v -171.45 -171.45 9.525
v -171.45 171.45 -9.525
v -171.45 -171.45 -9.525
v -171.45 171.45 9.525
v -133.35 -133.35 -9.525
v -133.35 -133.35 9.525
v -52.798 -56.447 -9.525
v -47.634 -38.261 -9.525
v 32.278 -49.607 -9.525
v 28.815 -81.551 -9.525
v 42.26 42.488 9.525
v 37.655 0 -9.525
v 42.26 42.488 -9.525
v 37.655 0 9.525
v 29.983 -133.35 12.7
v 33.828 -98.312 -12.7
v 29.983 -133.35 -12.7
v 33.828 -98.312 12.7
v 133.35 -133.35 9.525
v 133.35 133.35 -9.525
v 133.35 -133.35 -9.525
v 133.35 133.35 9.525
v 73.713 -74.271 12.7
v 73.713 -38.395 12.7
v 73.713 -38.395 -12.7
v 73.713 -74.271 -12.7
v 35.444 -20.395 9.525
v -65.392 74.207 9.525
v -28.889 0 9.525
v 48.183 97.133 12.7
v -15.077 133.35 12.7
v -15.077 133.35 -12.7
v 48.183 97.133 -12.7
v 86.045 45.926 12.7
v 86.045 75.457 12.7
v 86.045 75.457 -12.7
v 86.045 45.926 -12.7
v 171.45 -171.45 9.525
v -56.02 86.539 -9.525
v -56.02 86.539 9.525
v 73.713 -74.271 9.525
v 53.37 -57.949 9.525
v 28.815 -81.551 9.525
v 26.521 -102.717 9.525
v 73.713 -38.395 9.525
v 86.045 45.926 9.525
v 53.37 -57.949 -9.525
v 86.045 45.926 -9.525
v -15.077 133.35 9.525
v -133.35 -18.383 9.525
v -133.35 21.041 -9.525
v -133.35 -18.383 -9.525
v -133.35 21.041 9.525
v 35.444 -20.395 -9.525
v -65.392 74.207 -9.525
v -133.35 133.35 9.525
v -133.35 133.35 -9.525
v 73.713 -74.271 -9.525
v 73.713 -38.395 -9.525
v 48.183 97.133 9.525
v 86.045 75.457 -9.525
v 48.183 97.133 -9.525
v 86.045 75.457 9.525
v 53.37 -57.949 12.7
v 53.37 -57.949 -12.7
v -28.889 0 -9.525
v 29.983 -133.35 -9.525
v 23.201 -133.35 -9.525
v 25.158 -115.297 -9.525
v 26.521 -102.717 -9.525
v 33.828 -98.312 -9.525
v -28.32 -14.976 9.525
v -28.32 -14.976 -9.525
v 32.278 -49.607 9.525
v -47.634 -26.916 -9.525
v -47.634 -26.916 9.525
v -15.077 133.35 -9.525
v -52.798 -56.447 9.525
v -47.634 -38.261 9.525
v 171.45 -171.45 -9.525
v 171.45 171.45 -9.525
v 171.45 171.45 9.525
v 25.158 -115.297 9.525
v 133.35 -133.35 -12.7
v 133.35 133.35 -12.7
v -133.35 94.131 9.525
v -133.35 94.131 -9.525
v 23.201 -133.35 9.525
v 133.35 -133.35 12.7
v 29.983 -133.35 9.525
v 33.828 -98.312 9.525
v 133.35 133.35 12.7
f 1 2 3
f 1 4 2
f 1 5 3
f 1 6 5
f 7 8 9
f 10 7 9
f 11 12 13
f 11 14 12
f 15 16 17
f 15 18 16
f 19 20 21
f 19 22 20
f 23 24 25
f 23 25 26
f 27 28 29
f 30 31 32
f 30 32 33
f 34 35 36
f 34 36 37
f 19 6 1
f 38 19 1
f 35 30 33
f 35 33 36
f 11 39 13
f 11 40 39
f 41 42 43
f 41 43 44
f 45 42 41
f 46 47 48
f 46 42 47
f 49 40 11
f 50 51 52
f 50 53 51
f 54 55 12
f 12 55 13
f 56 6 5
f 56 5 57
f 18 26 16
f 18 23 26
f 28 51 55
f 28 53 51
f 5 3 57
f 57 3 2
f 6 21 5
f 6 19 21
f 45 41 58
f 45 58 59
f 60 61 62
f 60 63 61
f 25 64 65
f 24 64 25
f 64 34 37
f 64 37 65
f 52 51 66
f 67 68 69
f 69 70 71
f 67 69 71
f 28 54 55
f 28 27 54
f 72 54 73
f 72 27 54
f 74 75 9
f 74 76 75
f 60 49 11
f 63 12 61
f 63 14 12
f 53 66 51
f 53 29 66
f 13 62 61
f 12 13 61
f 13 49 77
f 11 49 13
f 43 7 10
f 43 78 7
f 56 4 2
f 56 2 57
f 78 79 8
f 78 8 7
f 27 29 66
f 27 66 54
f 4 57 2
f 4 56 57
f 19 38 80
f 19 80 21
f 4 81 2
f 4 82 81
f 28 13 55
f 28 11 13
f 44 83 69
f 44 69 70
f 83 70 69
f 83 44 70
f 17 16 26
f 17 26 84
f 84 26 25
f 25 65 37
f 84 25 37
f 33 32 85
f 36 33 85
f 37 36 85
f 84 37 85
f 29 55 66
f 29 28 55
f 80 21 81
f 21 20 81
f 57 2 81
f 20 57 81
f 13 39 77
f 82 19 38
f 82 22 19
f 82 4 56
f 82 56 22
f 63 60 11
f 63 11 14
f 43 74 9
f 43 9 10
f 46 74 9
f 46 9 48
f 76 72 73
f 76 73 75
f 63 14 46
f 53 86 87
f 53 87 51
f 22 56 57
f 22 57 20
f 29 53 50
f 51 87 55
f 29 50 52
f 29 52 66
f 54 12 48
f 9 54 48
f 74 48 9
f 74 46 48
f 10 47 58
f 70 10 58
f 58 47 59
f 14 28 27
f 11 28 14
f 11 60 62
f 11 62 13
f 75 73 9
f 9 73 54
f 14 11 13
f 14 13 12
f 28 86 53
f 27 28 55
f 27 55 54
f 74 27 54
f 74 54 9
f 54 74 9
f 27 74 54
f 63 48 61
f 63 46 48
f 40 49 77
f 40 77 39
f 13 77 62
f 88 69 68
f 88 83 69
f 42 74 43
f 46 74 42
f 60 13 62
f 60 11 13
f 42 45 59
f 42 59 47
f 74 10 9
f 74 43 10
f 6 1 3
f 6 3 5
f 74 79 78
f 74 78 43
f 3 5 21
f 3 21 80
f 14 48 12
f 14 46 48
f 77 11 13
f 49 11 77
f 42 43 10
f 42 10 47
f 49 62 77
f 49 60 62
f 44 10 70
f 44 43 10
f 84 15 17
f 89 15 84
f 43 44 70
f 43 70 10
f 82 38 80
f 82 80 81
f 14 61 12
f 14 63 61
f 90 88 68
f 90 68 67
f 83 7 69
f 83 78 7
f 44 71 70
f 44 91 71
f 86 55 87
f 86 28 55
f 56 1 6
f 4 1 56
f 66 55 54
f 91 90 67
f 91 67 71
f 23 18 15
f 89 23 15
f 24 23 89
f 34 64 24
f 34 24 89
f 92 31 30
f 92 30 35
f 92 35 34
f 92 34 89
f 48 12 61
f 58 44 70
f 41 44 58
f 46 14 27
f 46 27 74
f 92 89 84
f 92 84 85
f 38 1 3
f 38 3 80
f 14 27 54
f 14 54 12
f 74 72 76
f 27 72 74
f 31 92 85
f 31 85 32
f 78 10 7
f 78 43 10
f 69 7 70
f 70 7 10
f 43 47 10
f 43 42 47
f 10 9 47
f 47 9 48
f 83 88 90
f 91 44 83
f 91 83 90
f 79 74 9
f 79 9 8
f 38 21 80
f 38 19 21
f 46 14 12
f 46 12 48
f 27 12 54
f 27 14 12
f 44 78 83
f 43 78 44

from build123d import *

# Parameters (mm, degrees)
F1_DEPTH  = 9.525
F2_DEPTH  = 9.525
F3_DEPTH  = 9.525
F4_DEPTH  = 9.525
F5_DEPTH  = 9.525
F6_DEPTH  = 9.525
F7_DEPTH  = 9.525
F8_DEPTH  = 9.525
F9_DEPTH  = 9.525
F10_DEPTH = 9.525
F11_DEPTH = 9.525
F12_DEPTH = 9.525
F13_DEPTH = 9.525
F14_DEPTH = 9.525
F15_DEPTH = 9.525
F16_DEPTH = 9.525
F17_DEPTH = 9.525
F18_DEPTH = 9.525
F19_DEPTH = 9.525
F20_DEPTH = 12.7


with BuildPart() as f1:
    # F0 (on Top) → F1 (new body, symmetric)
    with BuildSketch(Plane.XY):
        Polygon((-171.45, 171.45), (-171.45, -171.45), (-133.35, -133.35), (-133.35, -18.3831825852), (-133.35, 21.0410188884), (-133.35, 94.1308289766), (-133.35, 133.35), align=None)
    extrude(amount=F1_DEPTH, both=True)


with BuildPart() as f2:
    # F0 (on Top) → F2 (new body, symmetric)
    with BuildSketch(Plane.XY):
        Polygon((171.45, 171.45), (-171.45, 171.45), (-133.35, 133.35), (-85.5590856828, 133.35), (-15.077165328, 133.35), (133.35, 133.35), align=None)
    extrude(amount=F2_DEPTH, both=True)

    # F0 (on Top) → F3 (join, symmetric)
    with BuildSketch(Plane.XY):
        Polygon((133.35, -133.35), (171.45, -171.45), (171.45, 171.45), (133.35, 133.35), align=None)
    extrude(amount=F3_DEPTH, both=True)


with BuildPart() as f4:
    # F0 (on Top) → F4 (new body, symmetric)
    with BuildSketch(Plane.XY):
        Polygon((-133.35, -133.35), (-171.45, -171.45), (171.45, -171.45), (133.35, -133.35), (29.9828406423, -133.35), (23.2006912545, -133.35), align=None)
    extrude(amount=F4_DEPTH, both=True)


with BuildPart() as f5:
    # F0 (on Top) → F5 (new body, symmetric)
    with BuildSketch(Plane.XY):
        Polygon((42.2602014288, 42.4880021912), (-15.077165328, 133.35), (-56.0195036232, 86.5388959646), align=None)
    extrude(amount=F5_DEPTH, both=True)


with BuildPart() as f6:
    # F0 (on Top) → F6 (new body, symmetric)
    with BuildSketch(Plane.XY):
        Polygon((-52.7975902858, -56.4470457543), (25.1575205185, -115.2968105278), (26.521067056, -102.7170906481), (28.8153099508, -81.5510122196), align=None)
    extrude(amount=F6_DEPTH, both=True)


with BuildPart() as f7:
    # F0 (on Top) → F7 (new body, symmetric)
    with BuildSketch(Plane.XY):
        Polygon((26.521067056, -102.7170906481), (33.8283727055, -98.3124413095), (73.7134516239, -74.2707774043), (73.7134516239, -38.3952504957), (53.3703944978, -57.9488465546), (28.8153099508, -81.5510122196), align=None)
    extrude(amount=F7_DEPTH, both=True)


with BuildPart() as f8:
    # F0 (on Top) → F8 (new body, symmetric)
    with BuildSketch(Plane.XY):
        Polygon((86.0454812646, 45.9258191538), (32.2778299451, -49.606718123), (28.8153099508, -81.5510122196), (53.3703944978, -57.9488465546), align=None)
    extrude(amount=F8_DEPTH, both=True)


with BuildPart() as f9:
    # F0 (on Top) → F9 (new body, symmetric)
    with BuildSketch(Plane.XY):
        Polygon((28.8153099508, -81.5510122196), (32.2778299451, -49.606718123), (-47.6337224245, -38.2612505928), (-52.7975902858, -56.4470457543), align=None)
    extrude(amount=F9_DEPTH, both=True)


with BuildPart() as f10:
    # F0 (on Top) → F10 (new body, symmetric)
    with BuildSketch(Plane.XY):
        Polygon((32.2778299451, -49.606718123), (-28.3199971136, -14.9760207202), (-47.6337224245, -26.9157830626), align=None)
    extrude(amount=F10_DEPTH, both=True)

    # F0 (on Top) → F11 (join, symmetric)
    with BuildSketch(Plane.XY):
        Polygon((35.4441672467, -20.3949272483), (-28.3199971136, -14.9760207202), (32.2778299451, -49.606718123), align=None)
    extrude(amount=F11_DEPTH, both=True)


with BuildPart() as f12:
    # F0 (on Top) → F12 (new body, symmetric)
    with BuildSketch(Plane.XY):
        Polygon((37.6548231832, 0), (35.4441672467, -20.3949272483), (32.2778299451, -49.606718123), (86.0454812646, 45.9258191538), align=None)
    extrude(amount=F12_DEPTH, both=True)


with BuildPart() as f13:
    # F0 (on Top) → F13 (new body, symmetric)
    with BuildSketch(Plane.XY):
        Polygon((86.0454812646, 75.4573446445), (37.6548231832, 0), (86.0454812646, 45.9258191538), align=None)
    extrude(amount=F13_DEPTH, both=True)


with BuildPart() as f14:
    # F0 (on Top) → F14 (new body, symmetric)
    with BuildSketch(Plane.XY):
        Polygon((86.0454812646, 75.4573446445), (48.1833487104, 97.1333931346), (42.2602014288, 42.4880021912), (37.6548231832, 0), align=None)
    extrude(amount=F14_DEPTH, both=True)


with BuildPart() as f15:
    # F0 (on Top) → F15 (new body, symmetric)
    with BuildSketch(Plane.XY):
        Polygon((48.1833487104, 97.1333931346), (-15.077165328, 133.35), (42.2602014288, 42.4880021912), align=None)
    extrude(amount=F15_DEPTH, both=True)


with BuildPart() as f16:
    # F0 (on Top) → F16 (new body, symmetric)
    with BuildSketch(Plane.XY):
        Polygon((42.2602014288, 42.4880021912), (-65.3918460011, 74.2068663239), (35.4441672467, -20.3949272483), (37.6548231832, 0), align=None)
    extrude(amount=F16_DEPTH, both=True)


with BuildPart() as f17:
    # F0 (on Top) → F17 (new body, symmetric)
    with BuildSketch(Plane.XY):
        Polygon((-65.3918460011, 74.2068663239), (-28.8890395314, 0), (35.4441672467, -20.3949272483), align=None)
    extrude(amount=F17_DEPTH, both=True)


with BuildPart() as f18:
    # F0 (on Top) → F18 (new body, symmetric)
    with BuildSketch(Plane.XY):
        Polygon((25.1575205185, -115.2968105278), (23.2006912545, -133.35), (29.9828406423, -133.35), (33.8283727055, -98.3124413095), (26.521067056, -102.7170906481), align=None)
    extrude(amount=F18_DEPTH, both=True)


with BuildPart() as f19:
    # F0 (on Top) → F19 (new body, symmetric)
    with BuildSketch(Plane.XY):
        Polygon((-133.35, 21.0410188884), (-133.35, -18.3831825852), (-28.8890395314, 0), align=None)
    extrude(amount=F19_DEPTH, both=True)


with BuildPart() as f19b:
    # F0 (on Top) → F19, piece 2 (new body, symmetric)
    with BuildSketch(Plane.XY):
        Polygon((-65.3918460011, 74.2068663239), (-133.35, 94.1308289766), (-133.35, 21.0410188884), align=None)
    extrude(amount=F19_DEPTH, both=True)


with BuildPart() as f20:
    # F0 (on Top) → F20 (new body, symmetric)
    with BuildSketch(Plane.XY):
        Polygon((29.9828406423, -133.35), (133.35, -133.35), (133.35, 133.35), (-15.077165328, 133.35), (48.1833487104, 97.1333931346), (86.0454812646, 75.4573446445), (86.0454812646, 45.9258191538), (53.3703944978, -57.9488465546), (73.7134516239, -38.3952504957), (73.7134516239, -74.2707774043), (33.8283727055, -98.3124413095), align=None)
    extrude(amount=F20_DEPTH, both=True)


solid = Compound([f1.part, f2.part, f4.part, f5.part, f6.part, f7.part, f8.part, f9.part, f10.part, f12.part, f13.part, f14.part, f15.part, f16.part, f17.part, f18.part, f19.part, f19b.part, f20.part])
